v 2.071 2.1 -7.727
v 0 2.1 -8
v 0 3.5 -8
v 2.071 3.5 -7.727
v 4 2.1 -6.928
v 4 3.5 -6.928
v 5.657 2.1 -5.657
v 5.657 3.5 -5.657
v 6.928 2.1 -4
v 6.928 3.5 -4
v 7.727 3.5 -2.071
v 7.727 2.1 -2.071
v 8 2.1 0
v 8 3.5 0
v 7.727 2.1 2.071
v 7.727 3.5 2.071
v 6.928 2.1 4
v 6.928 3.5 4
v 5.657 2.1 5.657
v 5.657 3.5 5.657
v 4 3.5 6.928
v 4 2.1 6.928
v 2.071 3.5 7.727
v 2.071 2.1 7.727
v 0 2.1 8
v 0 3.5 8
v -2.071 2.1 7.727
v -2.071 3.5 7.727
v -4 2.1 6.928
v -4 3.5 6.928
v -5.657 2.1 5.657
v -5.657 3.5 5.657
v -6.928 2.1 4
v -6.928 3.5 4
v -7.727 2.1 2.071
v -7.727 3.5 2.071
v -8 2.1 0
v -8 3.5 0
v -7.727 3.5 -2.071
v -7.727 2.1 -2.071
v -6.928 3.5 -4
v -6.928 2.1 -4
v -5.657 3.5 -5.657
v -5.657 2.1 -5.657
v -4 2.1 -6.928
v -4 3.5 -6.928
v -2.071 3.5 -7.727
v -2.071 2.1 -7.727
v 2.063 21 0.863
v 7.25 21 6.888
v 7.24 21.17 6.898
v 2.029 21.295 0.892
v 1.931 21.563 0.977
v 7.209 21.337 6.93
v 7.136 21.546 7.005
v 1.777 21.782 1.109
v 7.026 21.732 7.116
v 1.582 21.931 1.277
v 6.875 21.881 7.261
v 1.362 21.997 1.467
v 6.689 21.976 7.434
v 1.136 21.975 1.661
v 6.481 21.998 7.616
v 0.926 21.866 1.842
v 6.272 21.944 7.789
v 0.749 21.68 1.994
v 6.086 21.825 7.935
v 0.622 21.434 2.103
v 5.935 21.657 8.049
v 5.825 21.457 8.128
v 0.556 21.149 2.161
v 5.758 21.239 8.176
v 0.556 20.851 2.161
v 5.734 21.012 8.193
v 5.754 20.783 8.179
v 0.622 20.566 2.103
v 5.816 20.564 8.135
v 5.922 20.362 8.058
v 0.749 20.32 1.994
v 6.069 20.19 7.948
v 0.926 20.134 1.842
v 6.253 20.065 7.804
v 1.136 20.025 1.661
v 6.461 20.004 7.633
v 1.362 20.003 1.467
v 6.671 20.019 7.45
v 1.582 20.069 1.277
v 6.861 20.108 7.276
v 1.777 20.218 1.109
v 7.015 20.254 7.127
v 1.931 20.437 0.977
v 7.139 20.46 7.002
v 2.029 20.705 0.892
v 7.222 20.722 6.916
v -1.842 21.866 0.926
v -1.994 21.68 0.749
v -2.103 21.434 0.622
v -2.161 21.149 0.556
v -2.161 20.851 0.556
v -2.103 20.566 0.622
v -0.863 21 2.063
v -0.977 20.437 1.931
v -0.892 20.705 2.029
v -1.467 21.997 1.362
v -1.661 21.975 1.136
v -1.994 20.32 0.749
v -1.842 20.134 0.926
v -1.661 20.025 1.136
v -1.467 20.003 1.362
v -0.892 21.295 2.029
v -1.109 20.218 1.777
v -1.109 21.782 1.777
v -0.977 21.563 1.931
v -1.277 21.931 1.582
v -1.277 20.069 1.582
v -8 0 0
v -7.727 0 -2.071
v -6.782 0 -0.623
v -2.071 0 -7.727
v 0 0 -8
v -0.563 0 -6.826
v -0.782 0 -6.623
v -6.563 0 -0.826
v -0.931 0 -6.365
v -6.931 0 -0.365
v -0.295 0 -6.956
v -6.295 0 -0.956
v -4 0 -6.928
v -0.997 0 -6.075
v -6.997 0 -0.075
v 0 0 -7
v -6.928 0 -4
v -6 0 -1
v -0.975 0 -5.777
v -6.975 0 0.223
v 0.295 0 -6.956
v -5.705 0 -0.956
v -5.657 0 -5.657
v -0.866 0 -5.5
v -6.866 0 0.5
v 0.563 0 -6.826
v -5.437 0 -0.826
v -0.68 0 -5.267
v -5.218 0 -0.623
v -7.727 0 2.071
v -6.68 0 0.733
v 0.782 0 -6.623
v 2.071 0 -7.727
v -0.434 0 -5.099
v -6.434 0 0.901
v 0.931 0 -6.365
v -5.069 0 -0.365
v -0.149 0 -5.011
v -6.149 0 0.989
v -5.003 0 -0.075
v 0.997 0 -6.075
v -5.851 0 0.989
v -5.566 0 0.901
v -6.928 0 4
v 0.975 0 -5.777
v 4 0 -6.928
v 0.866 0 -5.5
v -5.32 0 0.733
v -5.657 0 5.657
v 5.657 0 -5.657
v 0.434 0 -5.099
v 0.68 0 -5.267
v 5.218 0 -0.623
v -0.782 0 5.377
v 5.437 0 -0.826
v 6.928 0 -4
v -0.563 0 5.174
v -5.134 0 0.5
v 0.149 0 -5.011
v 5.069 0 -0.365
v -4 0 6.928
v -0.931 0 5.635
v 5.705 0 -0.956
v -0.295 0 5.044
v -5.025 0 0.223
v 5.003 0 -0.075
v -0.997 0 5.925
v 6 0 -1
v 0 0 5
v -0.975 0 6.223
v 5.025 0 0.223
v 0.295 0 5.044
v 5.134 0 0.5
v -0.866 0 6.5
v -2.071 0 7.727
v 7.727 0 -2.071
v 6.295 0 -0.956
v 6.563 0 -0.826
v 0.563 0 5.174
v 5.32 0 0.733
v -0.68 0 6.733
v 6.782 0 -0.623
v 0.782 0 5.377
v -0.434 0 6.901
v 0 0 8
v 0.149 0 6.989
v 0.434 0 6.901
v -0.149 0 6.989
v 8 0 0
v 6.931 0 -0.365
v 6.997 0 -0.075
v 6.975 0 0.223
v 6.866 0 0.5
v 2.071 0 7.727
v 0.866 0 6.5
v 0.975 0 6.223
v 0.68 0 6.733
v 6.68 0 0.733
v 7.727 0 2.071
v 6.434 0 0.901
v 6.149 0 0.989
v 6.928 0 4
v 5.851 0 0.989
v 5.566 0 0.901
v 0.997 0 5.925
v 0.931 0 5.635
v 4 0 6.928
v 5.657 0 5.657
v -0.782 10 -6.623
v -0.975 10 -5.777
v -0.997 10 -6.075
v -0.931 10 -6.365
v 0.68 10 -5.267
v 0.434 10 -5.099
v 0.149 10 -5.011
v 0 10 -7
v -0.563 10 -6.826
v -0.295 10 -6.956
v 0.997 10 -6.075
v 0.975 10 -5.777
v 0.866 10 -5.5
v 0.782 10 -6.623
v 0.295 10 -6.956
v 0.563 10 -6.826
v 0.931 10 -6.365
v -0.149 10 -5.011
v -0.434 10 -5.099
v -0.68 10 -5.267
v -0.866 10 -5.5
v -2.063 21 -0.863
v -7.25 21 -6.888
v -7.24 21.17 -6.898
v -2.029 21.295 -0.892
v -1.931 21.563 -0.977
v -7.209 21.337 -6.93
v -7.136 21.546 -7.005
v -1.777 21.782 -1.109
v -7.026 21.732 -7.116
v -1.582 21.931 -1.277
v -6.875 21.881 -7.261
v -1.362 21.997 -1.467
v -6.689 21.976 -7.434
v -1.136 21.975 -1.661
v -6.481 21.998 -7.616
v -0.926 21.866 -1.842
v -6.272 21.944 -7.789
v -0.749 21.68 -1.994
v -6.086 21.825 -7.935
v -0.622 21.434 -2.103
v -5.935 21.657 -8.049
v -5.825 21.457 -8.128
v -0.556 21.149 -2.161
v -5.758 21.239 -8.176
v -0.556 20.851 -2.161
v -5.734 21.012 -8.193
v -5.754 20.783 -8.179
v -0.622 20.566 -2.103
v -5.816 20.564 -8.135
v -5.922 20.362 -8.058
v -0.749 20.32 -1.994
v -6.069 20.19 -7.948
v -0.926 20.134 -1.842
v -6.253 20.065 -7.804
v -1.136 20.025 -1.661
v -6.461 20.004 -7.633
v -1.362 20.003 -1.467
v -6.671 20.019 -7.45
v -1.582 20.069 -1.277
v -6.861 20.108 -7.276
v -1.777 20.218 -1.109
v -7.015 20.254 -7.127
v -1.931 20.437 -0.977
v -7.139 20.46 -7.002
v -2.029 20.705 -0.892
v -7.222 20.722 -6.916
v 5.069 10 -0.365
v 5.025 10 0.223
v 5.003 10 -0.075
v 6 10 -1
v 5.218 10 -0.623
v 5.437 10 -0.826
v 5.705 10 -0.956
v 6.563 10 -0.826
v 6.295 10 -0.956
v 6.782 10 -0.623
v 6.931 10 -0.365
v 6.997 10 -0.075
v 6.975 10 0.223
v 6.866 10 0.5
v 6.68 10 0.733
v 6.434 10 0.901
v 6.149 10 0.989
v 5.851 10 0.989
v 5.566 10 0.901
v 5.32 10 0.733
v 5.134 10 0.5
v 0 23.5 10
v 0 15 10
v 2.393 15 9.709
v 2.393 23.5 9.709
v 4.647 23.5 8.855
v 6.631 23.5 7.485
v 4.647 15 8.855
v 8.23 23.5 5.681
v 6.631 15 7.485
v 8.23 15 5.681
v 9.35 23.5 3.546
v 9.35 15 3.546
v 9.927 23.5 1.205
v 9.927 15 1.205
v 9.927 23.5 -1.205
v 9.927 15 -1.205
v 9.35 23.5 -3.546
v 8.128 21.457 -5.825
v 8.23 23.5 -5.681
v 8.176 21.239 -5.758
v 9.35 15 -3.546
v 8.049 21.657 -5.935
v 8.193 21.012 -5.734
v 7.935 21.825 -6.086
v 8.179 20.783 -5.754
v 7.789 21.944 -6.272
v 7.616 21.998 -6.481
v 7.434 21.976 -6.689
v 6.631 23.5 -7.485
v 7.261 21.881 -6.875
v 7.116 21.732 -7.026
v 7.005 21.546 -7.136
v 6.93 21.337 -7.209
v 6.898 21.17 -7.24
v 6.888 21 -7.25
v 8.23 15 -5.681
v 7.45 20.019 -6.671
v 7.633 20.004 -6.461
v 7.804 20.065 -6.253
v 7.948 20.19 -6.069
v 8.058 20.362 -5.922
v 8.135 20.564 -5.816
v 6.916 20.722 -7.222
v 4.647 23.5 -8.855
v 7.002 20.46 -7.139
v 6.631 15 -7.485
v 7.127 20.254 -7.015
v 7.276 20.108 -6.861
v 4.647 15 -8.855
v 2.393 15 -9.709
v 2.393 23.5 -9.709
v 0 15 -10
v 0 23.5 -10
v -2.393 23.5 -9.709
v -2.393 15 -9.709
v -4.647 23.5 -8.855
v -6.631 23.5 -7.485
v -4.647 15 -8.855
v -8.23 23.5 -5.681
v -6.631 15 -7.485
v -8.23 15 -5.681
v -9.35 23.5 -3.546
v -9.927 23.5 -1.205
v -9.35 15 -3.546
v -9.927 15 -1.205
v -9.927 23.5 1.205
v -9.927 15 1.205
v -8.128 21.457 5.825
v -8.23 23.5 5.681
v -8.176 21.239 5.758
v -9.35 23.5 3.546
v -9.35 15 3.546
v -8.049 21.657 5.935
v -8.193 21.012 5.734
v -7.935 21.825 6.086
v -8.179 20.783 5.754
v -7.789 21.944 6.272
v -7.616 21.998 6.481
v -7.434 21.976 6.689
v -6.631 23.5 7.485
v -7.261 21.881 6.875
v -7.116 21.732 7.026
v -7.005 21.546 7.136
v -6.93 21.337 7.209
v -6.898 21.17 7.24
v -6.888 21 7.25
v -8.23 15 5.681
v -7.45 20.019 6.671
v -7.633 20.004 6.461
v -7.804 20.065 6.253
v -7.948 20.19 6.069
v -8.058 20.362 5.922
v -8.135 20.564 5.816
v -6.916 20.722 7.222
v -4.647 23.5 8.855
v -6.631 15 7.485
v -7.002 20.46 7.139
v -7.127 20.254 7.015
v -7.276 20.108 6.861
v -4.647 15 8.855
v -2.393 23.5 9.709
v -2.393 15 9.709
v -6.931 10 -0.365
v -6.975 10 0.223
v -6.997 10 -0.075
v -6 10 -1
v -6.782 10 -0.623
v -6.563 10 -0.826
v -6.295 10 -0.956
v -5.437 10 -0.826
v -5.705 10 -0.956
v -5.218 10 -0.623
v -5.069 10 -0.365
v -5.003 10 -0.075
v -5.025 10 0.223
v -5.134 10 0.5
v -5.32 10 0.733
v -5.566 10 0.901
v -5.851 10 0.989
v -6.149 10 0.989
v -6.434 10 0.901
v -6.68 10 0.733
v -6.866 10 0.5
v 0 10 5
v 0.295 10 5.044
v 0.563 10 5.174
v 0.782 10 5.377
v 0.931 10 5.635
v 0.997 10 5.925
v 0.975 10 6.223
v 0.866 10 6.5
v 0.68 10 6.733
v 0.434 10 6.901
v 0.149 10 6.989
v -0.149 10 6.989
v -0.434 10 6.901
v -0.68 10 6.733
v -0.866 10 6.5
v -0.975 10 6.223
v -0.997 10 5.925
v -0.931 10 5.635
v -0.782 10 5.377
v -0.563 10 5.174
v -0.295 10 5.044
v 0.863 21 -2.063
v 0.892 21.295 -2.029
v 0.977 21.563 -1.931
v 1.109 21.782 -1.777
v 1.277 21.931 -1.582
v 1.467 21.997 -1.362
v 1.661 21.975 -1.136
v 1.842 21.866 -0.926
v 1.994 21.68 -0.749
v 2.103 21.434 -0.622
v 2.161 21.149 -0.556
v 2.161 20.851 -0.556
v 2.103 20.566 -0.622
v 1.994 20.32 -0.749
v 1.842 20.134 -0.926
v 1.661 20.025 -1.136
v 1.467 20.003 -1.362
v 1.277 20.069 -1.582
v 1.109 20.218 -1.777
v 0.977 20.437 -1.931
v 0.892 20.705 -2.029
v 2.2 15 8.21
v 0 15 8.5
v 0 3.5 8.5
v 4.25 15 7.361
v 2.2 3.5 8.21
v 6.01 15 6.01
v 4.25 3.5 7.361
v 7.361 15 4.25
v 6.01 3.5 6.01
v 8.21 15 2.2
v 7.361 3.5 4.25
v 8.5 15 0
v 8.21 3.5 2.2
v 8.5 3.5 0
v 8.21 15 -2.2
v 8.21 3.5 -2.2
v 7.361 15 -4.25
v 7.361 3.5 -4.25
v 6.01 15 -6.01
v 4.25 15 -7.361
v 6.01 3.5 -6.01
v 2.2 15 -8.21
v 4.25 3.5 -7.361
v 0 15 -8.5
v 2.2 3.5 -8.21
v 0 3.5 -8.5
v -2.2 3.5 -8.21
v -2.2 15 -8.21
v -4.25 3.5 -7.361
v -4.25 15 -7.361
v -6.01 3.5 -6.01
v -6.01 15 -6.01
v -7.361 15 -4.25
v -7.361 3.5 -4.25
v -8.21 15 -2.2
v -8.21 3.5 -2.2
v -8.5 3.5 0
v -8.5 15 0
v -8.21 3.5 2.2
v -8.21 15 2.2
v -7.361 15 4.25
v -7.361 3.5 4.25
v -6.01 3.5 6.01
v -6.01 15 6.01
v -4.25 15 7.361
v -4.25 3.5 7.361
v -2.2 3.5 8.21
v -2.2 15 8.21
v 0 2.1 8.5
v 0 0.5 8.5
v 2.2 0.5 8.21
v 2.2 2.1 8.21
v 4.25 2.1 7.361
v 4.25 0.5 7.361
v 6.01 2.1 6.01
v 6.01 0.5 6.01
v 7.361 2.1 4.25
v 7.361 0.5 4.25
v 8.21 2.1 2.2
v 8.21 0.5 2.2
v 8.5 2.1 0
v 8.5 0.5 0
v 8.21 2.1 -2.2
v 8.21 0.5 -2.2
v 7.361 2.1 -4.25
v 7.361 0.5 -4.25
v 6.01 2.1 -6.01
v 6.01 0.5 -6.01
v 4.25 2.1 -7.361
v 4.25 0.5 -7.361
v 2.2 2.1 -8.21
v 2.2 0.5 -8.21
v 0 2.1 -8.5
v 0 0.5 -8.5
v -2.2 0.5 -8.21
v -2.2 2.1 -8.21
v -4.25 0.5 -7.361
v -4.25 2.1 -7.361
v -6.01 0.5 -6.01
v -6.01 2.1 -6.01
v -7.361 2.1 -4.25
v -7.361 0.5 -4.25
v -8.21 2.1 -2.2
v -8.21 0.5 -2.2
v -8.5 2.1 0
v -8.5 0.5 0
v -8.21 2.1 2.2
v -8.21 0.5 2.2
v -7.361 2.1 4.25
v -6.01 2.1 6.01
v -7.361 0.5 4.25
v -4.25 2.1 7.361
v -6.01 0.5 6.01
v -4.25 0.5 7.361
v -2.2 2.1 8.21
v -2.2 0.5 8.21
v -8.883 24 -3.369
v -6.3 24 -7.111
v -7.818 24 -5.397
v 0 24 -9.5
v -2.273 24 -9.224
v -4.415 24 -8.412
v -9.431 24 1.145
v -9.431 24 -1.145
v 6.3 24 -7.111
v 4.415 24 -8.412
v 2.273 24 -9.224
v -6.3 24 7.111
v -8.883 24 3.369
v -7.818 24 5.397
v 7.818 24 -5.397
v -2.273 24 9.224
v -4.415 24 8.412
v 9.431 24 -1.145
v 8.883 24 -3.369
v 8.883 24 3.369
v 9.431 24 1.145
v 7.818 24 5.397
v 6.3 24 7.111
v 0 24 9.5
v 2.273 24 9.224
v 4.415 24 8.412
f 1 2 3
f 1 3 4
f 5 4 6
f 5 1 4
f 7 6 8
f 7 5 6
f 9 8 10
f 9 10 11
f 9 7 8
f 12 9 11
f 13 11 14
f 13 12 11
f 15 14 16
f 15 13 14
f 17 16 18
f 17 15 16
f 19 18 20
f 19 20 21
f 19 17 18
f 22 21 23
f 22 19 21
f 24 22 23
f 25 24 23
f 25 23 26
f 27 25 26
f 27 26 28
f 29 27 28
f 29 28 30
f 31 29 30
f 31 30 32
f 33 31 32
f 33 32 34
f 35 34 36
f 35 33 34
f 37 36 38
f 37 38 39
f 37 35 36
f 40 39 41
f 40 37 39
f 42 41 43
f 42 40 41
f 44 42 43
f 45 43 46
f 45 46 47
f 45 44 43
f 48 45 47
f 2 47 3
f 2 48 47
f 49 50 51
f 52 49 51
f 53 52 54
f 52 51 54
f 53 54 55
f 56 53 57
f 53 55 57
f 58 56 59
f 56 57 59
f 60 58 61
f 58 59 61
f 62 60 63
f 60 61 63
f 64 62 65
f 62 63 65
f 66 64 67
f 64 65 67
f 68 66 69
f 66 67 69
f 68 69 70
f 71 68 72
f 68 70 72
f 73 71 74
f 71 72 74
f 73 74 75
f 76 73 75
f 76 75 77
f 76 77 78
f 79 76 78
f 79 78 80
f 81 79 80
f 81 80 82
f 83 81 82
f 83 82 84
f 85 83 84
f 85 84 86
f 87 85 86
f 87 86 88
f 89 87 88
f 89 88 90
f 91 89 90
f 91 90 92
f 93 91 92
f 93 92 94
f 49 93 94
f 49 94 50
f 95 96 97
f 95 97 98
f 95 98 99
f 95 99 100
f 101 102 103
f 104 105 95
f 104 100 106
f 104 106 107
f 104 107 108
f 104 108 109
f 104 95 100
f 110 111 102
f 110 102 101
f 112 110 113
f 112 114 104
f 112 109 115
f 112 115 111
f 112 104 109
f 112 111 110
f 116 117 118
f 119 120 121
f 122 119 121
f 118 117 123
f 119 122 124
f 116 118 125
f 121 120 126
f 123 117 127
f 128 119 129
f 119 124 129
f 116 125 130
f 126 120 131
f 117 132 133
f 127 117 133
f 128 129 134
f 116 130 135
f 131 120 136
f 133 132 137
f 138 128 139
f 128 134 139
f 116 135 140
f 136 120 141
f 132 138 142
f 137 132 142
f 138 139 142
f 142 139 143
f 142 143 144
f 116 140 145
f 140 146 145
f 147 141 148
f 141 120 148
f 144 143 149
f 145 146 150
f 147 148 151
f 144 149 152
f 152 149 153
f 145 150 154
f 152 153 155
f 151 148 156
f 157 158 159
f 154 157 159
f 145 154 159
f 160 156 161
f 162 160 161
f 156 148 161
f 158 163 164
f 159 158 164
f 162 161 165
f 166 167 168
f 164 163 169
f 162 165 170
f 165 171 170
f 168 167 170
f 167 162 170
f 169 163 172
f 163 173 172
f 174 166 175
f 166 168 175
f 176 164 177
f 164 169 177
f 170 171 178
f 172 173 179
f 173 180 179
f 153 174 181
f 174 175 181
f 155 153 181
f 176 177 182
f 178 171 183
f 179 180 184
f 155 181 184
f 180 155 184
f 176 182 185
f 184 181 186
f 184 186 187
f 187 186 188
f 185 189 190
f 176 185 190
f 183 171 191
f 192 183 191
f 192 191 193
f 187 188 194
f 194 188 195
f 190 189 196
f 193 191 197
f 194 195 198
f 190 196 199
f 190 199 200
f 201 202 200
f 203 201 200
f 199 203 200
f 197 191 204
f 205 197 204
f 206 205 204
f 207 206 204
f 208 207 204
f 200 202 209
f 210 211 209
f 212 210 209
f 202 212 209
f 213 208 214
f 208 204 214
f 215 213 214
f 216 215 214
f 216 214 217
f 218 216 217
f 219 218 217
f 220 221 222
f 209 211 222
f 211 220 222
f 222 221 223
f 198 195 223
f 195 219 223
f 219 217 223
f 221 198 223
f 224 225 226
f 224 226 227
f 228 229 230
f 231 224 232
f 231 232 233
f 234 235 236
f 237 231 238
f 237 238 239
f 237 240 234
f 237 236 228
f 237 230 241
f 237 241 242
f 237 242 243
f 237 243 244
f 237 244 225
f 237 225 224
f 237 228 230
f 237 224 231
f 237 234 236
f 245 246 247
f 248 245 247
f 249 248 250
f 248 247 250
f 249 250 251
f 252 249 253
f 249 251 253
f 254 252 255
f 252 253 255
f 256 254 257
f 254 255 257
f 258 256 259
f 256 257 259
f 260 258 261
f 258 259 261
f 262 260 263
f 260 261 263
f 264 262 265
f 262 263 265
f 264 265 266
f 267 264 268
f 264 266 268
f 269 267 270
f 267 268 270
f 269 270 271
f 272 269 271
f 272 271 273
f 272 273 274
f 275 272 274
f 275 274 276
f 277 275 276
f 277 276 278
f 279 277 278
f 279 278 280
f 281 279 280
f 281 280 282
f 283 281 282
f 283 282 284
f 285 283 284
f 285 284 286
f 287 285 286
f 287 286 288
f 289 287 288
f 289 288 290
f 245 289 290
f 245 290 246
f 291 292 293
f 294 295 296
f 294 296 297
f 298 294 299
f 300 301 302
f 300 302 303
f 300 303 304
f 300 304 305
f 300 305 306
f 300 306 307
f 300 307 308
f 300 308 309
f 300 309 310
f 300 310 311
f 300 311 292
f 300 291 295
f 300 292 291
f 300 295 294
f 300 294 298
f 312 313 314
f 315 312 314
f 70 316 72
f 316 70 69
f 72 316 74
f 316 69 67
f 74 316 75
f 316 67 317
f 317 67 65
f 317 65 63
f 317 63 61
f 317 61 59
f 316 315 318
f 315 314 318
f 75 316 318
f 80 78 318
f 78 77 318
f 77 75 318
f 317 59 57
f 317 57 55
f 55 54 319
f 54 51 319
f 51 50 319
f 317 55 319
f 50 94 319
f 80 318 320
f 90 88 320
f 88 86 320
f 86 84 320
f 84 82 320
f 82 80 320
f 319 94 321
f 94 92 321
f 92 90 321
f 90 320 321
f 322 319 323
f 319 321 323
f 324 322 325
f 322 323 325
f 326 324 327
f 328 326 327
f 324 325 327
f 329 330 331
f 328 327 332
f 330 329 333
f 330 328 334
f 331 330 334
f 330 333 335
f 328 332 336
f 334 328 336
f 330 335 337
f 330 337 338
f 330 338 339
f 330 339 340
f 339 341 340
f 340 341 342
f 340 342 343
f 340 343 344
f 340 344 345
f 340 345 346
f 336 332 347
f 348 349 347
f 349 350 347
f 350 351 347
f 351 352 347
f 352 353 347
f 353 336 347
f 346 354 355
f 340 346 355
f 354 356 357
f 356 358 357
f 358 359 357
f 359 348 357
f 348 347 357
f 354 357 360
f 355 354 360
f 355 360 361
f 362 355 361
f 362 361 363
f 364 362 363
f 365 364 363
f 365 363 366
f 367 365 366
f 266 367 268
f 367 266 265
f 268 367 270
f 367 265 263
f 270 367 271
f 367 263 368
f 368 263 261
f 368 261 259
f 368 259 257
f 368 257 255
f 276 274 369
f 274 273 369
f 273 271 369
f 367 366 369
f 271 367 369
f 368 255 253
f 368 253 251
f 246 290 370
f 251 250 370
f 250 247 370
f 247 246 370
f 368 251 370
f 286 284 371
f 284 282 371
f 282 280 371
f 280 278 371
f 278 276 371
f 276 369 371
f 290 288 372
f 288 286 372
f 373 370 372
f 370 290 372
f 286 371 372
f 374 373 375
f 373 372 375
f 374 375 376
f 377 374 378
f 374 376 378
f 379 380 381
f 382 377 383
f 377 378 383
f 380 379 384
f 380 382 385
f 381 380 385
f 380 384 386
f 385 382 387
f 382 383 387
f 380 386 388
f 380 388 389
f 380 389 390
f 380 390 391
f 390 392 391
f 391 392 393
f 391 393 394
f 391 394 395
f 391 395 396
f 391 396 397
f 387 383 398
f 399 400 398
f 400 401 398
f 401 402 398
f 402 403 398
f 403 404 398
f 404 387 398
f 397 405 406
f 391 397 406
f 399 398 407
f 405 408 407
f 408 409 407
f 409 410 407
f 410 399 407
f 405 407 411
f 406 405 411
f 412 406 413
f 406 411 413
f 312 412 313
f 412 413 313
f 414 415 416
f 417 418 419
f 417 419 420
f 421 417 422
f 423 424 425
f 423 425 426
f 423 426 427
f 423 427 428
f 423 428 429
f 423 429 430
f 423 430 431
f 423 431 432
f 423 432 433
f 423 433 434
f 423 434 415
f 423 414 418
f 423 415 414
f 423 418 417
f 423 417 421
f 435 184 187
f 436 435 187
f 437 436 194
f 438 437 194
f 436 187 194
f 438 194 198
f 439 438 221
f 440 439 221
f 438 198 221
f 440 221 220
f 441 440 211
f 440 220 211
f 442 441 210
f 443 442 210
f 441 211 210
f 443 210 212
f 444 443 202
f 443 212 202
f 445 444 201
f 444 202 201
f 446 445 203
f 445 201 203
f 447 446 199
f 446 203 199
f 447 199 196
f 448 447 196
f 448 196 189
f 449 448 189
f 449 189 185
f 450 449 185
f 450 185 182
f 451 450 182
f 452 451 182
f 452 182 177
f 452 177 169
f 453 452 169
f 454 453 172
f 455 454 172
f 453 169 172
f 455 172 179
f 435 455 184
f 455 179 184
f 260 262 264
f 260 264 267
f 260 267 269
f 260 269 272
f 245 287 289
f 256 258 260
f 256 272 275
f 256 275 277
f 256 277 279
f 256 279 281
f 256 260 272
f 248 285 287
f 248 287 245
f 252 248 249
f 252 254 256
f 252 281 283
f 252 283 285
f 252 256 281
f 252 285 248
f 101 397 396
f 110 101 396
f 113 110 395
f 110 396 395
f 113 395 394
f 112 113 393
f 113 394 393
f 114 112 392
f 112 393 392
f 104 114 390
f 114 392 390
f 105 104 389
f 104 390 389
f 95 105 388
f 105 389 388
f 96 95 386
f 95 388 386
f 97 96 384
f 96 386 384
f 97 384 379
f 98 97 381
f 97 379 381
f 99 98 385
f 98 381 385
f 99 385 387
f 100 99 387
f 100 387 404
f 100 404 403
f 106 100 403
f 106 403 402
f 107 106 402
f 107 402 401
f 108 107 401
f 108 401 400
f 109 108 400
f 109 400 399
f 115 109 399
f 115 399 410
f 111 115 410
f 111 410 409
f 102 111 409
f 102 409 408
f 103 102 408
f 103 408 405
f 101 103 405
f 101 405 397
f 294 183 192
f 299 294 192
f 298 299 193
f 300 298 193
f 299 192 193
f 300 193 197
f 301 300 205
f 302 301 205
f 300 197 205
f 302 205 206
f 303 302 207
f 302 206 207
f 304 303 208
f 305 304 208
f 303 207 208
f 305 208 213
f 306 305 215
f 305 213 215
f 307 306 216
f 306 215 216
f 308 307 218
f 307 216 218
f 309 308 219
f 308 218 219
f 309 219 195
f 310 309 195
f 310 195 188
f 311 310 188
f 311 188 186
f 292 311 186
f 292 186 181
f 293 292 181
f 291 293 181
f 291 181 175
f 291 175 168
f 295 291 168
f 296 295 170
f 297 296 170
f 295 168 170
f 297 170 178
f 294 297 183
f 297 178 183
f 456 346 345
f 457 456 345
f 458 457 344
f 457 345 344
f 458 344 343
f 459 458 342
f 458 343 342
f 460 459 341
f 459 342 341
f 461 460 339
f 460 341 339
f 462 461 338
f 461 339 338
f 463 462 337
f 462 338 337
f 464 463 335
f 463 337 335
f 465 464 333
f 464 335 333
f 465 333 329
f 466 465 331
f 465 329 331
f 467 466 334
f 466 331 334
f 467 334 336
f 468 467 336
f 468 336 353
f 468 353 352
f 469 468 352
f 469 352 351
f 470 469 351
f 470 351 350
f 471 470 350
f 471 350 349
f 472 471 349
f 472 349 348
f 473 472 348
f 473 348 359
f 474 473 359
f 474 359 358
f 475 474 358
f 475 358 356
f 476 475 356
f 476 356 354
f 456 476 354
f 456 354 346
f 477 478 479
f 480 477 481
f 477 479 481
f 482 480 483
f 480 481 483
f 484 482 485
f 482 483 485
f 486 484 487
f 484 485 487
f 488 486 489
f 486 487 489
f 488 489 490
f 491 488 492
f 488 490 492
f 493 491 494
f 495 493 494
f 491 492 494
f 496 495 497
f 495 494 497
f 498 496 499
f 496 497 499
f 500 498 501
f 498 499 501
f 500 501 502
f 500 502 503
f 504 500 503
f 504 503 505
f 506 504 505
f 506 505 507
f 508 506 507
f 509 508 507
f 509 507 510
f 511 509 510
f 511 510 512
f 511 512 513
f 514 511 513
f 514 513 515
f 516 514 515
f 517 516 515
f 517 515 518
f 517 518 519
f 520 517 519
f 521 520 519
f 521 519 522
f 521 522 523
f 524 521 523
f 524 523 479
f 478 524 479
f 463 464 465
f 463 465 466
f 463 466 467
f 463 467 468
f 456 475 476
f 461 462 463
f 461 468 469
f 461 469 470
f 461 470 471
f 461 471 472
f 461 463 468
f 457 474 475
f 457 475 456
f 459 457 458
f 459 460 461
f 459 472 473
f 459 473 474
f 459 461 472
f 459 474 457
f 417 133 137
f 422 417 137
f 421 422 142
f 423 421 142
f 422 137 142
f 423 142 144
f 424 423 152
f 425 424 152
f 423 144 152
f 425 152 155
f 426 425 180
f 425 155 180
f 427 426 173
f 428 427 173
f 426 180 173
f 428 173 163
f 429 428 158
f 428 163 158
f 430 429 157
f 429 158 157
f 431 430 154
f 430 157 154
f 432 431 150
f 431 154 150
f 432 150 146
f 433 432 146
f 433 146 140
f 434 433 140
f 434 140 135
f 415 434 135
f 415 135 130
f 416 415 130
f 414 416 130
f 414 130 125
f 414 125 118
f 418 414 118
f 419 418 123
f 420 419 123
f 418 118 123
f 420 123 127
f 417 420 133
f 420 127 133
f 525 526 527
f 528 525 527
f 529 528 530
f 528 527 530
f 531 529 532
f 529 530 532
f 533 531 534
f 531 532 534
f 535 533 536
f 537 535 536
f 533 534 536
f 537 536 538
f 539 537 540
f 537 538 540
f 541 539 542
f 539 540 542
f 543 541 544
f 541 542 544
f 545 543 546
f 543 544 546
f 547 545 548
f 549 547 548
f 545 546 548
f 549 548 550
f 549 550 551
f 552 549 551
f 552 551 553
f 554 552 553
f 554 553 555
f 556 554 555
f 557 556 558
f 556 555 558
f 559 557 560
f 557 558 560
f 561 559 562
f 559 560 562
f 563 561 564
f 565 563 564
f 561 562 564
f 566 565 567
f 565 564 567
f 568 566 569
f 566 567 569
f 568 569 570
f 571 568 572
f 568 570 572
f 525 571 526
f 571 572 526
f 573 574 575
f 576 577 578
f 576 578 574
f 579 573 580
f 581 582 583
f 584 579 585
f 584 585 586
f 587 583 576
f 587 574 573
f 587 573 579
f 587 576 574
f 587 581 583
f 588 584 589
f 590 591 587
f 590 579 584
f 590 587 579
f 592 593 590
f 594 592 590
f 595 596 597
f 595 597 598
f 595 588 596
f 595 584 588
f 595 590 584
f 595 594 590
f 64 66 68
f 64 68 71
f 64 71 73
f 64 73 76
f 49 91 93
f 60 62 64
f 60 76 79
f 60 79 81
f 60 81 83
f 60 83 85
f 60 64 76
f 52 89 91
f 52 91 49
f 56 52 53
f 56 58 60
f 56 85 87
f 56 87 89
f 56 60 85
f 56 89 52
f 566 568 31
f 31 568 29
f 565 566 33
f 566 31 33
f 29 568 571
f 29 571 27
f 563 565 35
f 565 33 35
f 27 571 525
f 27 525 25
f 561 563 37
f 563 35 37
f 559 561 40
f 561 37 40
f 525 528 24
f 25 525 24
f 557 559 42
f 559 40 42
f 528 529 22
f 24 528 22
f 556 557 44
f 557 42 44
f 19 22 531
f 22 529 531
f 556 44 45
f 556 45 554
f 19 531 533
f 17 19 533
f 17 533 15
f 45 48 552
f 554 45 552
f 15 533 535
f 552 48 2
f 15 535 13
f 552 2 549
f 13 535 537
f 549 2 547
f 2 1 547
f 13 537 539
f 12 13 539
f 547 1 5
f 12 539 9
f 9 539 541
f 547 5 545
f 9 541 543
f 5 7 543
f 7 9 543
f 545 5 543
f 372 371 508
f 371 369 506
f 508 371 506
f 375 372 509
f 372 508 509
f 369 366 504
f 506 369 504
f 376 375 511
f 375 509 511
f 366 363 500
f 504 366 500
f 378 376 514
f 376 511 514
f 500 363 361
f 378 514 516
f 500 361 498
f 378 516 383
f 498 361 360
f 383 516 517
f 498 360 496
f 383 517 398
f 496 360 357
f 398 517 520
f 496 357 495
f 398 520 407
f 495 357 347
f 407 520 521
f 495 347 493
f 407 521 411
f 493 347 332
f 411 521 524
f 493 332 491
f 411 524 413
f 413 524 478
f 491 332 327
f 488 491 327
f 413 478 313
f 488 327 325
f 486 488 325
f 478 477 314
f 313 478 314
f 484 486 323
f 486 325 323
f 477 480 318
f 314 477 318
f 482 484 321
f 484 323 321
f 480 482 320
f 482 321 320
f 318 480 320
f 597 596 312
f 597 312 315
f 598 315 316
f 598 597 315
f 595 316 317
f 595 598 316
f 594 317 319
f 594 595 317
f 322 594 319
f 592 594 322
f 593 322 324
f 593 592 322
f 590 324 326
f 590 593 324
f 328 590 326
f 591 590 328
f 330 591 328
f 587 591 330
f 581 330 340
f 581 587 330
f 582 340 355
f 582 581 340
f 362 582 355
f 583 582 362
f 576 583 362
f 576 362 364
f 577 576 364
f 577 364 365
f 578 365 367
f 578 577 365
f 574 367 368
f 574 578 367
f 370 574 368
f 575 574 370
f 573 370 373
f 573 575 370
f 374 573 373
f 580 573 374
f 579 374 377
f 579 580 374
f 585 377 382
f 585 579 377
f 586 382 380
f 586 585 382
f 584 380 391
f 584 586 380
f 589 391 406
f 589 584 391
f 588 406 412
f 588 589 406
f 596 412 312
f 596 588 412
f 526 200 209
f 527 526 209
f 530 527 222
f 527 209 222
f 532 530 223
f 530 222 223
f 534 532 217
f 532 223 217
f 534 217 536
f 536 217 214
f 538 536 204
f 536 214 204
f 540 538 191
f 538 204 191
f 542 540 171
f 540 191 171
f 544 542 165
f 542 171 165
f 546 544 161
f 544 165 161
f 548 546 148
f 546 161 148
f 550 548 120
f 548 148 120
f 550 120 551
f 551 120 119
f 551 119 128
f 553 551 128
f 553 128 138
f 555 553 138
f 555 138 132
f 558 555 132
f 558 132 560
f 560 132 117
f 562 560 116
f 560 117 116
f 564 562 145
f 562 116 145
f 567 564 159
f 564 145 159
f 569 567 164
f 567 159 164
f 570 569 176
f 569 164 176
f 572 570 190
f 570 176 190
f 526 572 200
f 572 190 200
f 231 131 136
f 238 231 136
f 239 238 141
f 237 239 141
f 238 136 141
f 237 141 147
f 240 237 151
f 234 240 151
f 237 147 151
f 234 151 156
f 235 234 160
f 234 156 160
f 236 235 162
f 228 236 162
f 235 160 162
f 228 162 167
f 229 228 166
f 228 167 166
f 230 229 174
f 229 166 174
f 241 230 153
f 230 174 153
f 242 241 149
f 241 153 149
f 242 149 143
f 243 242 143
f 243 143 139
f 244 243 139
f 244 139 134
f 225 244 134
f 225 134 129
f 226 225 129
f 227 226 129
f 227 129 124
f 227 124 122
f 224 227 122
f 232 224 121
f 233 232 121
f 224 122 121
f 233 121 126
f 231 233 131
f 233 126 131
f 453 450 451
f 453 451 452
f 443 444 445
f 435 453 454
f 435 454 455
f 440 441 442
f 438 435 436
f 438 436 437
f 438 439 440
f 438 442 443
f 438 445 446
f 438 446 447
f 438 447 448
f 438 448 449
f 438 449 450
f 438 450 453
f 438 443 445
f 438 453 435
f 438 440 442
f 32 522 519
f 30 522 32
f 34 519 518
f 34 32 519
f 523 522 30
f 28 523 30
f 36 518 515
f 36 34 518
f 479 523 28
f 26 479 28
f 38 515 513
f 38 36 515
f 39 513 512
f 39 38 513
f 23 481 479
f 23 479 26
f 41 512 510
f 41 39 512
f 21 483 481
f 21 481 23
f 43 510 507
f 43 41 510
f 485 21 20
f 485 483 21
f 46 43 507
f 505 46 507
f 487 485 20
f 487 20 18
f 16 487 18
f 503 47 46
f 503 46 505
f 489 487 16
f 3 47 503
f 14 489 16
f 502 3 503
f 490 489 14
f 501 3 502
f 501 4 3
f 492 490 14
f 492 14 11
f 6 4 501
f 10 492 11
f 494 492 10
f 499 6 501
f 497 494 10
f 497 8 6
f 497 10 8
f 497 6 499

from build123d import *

# Parameters (mm, degrees)
SKETCH_1_R               = 8.5
EXTRUDE_1_DEPTH          = 15
SKETCH_2_R               = 10
EXTRUDE_2_DEPTH          = 9
SKETCH_3_R               = 1
CUT_EXTRUDE_1_DEPTH      = 10
CUT_EXTRUDE_START        = -2.1
SKETCH_4_R               = 8.5
SKETCH_4_R_2             = 8
CUT_EXTRUDE_2_DEPTH      = 1.4
CHAMFER_1_SIZE           = 0.5
SKETCH_7_R               = 1
CUT_EXTRUDE_3_DEPTH      = 8
PATTERN_CIRCULAR_1_COUNT = 4


with BuildPart() as part:
    # Эскиз1 → Бобышка-Вытянуть1 (new body)
    with BuildSketch(Plane(origin=(0, 0, 0), x_dir=(1, 0, 0), z_dir=(0, 1, 0))):
        with Locations(Location((0, 0, 0), (0, 0, 270))):
            Circle(SKETCH_1_R)
    extrude(amount=EXTRUDE_1_DEPTH)

    # Эскиз2 → Бобышка-Вытянуть2 (add)
    with BuildSketch(Plane(origin=(0, 15, 0), x_dir=(1, 0, 0), z_dir=(0, 1, 0))):
        with Locations(Location((0, 0, 0), (0, 0, 270))):
            Circle(SKETCH_2_R)
    extrude(amount=EXTRUDE_2_DEPTH)

    # Эскиз3 → Вырез-Вытянуть1 (cut)
    with BuildSketch(Plane.XZ):
        with Locations(Location((0, 6, 0), (0, 0, 270))):
            Circle(SKETCH_3_R)
        with Locations(Location((6, 0, 0), (0, 0, 270))):
            Circle(SKETCH_3_R)
        with Locations(Location((0, -6, 0), (0, 0, 270))):
            Circle(SKETCH_3_R)
        with Locations(Location((-6, 0, 0), (0, 0, 270))):
            Circle(SKETCH_3_R)
    extrude(amount=-CUT_EXTRUDE_1_DEPTH, mode=Mode.SUBTRACT)

    # Эскиз4 → Вырез-Вытянуть2 (cut)
    with BuildSketch(Plane.XZ.offset(CUT_EXTRUDE_START)):
        with Locations(Location((0, 0, 0), (0, 0, 270))):
            Circle(SKETCH_4_R)
        with Locations(Location((0, 0, 0), (0, 0, 270))):
            Circle(SKETCH_4_R_2, mode=Mode.SUBTRACT)
    extrude(amount=-CUT_EXTRUDE_2_DEPTH, mode=Mode.SUBTRACT)

    # Фаска1
    chamfer_1_edges = [part.edges().sort_by_distance(p)[0] for p in [
        (0, 0, -8.5),
        (0, 24, -10),
    ]]
    chamfer(chamfer_1_edges, length=CHAMFER_1_SIZE)

    # Эскиз7 → Вырез-Вытянуть3 (cut)
    with BuildSketch(Plane(origin=(6.524591557, 0, 7.578238913), x_dir=(0.7578238912515232, 0, -0.6524591556935956), z_dir=(0.6524591556935956, 0, 0.7578238912515232))):
        with Locations((0, 21)):
            Circle(SKETCH_7_R)
    cut_extrude_3 = extrude(amount=-CUT_EXTRUDE_3_DEPTH, mode=Mode.SUBTRACT)

    # Круговой массив1: Вырез-Вытянуть3 ×4 about axis
    pattern_circular_1_axis = Axis((0, 0, 0), (0, 1, 0))
    for i in range(1, PATTERN_CIRCULAR_1_COUNT):
        add(cut_extrude_3.rotate(pattern_circular_1_axis, i * 360 / PATTERN_CIRCULAR_1_COUNT), mode=Mode.SUBTRACT)


solid = part.part
